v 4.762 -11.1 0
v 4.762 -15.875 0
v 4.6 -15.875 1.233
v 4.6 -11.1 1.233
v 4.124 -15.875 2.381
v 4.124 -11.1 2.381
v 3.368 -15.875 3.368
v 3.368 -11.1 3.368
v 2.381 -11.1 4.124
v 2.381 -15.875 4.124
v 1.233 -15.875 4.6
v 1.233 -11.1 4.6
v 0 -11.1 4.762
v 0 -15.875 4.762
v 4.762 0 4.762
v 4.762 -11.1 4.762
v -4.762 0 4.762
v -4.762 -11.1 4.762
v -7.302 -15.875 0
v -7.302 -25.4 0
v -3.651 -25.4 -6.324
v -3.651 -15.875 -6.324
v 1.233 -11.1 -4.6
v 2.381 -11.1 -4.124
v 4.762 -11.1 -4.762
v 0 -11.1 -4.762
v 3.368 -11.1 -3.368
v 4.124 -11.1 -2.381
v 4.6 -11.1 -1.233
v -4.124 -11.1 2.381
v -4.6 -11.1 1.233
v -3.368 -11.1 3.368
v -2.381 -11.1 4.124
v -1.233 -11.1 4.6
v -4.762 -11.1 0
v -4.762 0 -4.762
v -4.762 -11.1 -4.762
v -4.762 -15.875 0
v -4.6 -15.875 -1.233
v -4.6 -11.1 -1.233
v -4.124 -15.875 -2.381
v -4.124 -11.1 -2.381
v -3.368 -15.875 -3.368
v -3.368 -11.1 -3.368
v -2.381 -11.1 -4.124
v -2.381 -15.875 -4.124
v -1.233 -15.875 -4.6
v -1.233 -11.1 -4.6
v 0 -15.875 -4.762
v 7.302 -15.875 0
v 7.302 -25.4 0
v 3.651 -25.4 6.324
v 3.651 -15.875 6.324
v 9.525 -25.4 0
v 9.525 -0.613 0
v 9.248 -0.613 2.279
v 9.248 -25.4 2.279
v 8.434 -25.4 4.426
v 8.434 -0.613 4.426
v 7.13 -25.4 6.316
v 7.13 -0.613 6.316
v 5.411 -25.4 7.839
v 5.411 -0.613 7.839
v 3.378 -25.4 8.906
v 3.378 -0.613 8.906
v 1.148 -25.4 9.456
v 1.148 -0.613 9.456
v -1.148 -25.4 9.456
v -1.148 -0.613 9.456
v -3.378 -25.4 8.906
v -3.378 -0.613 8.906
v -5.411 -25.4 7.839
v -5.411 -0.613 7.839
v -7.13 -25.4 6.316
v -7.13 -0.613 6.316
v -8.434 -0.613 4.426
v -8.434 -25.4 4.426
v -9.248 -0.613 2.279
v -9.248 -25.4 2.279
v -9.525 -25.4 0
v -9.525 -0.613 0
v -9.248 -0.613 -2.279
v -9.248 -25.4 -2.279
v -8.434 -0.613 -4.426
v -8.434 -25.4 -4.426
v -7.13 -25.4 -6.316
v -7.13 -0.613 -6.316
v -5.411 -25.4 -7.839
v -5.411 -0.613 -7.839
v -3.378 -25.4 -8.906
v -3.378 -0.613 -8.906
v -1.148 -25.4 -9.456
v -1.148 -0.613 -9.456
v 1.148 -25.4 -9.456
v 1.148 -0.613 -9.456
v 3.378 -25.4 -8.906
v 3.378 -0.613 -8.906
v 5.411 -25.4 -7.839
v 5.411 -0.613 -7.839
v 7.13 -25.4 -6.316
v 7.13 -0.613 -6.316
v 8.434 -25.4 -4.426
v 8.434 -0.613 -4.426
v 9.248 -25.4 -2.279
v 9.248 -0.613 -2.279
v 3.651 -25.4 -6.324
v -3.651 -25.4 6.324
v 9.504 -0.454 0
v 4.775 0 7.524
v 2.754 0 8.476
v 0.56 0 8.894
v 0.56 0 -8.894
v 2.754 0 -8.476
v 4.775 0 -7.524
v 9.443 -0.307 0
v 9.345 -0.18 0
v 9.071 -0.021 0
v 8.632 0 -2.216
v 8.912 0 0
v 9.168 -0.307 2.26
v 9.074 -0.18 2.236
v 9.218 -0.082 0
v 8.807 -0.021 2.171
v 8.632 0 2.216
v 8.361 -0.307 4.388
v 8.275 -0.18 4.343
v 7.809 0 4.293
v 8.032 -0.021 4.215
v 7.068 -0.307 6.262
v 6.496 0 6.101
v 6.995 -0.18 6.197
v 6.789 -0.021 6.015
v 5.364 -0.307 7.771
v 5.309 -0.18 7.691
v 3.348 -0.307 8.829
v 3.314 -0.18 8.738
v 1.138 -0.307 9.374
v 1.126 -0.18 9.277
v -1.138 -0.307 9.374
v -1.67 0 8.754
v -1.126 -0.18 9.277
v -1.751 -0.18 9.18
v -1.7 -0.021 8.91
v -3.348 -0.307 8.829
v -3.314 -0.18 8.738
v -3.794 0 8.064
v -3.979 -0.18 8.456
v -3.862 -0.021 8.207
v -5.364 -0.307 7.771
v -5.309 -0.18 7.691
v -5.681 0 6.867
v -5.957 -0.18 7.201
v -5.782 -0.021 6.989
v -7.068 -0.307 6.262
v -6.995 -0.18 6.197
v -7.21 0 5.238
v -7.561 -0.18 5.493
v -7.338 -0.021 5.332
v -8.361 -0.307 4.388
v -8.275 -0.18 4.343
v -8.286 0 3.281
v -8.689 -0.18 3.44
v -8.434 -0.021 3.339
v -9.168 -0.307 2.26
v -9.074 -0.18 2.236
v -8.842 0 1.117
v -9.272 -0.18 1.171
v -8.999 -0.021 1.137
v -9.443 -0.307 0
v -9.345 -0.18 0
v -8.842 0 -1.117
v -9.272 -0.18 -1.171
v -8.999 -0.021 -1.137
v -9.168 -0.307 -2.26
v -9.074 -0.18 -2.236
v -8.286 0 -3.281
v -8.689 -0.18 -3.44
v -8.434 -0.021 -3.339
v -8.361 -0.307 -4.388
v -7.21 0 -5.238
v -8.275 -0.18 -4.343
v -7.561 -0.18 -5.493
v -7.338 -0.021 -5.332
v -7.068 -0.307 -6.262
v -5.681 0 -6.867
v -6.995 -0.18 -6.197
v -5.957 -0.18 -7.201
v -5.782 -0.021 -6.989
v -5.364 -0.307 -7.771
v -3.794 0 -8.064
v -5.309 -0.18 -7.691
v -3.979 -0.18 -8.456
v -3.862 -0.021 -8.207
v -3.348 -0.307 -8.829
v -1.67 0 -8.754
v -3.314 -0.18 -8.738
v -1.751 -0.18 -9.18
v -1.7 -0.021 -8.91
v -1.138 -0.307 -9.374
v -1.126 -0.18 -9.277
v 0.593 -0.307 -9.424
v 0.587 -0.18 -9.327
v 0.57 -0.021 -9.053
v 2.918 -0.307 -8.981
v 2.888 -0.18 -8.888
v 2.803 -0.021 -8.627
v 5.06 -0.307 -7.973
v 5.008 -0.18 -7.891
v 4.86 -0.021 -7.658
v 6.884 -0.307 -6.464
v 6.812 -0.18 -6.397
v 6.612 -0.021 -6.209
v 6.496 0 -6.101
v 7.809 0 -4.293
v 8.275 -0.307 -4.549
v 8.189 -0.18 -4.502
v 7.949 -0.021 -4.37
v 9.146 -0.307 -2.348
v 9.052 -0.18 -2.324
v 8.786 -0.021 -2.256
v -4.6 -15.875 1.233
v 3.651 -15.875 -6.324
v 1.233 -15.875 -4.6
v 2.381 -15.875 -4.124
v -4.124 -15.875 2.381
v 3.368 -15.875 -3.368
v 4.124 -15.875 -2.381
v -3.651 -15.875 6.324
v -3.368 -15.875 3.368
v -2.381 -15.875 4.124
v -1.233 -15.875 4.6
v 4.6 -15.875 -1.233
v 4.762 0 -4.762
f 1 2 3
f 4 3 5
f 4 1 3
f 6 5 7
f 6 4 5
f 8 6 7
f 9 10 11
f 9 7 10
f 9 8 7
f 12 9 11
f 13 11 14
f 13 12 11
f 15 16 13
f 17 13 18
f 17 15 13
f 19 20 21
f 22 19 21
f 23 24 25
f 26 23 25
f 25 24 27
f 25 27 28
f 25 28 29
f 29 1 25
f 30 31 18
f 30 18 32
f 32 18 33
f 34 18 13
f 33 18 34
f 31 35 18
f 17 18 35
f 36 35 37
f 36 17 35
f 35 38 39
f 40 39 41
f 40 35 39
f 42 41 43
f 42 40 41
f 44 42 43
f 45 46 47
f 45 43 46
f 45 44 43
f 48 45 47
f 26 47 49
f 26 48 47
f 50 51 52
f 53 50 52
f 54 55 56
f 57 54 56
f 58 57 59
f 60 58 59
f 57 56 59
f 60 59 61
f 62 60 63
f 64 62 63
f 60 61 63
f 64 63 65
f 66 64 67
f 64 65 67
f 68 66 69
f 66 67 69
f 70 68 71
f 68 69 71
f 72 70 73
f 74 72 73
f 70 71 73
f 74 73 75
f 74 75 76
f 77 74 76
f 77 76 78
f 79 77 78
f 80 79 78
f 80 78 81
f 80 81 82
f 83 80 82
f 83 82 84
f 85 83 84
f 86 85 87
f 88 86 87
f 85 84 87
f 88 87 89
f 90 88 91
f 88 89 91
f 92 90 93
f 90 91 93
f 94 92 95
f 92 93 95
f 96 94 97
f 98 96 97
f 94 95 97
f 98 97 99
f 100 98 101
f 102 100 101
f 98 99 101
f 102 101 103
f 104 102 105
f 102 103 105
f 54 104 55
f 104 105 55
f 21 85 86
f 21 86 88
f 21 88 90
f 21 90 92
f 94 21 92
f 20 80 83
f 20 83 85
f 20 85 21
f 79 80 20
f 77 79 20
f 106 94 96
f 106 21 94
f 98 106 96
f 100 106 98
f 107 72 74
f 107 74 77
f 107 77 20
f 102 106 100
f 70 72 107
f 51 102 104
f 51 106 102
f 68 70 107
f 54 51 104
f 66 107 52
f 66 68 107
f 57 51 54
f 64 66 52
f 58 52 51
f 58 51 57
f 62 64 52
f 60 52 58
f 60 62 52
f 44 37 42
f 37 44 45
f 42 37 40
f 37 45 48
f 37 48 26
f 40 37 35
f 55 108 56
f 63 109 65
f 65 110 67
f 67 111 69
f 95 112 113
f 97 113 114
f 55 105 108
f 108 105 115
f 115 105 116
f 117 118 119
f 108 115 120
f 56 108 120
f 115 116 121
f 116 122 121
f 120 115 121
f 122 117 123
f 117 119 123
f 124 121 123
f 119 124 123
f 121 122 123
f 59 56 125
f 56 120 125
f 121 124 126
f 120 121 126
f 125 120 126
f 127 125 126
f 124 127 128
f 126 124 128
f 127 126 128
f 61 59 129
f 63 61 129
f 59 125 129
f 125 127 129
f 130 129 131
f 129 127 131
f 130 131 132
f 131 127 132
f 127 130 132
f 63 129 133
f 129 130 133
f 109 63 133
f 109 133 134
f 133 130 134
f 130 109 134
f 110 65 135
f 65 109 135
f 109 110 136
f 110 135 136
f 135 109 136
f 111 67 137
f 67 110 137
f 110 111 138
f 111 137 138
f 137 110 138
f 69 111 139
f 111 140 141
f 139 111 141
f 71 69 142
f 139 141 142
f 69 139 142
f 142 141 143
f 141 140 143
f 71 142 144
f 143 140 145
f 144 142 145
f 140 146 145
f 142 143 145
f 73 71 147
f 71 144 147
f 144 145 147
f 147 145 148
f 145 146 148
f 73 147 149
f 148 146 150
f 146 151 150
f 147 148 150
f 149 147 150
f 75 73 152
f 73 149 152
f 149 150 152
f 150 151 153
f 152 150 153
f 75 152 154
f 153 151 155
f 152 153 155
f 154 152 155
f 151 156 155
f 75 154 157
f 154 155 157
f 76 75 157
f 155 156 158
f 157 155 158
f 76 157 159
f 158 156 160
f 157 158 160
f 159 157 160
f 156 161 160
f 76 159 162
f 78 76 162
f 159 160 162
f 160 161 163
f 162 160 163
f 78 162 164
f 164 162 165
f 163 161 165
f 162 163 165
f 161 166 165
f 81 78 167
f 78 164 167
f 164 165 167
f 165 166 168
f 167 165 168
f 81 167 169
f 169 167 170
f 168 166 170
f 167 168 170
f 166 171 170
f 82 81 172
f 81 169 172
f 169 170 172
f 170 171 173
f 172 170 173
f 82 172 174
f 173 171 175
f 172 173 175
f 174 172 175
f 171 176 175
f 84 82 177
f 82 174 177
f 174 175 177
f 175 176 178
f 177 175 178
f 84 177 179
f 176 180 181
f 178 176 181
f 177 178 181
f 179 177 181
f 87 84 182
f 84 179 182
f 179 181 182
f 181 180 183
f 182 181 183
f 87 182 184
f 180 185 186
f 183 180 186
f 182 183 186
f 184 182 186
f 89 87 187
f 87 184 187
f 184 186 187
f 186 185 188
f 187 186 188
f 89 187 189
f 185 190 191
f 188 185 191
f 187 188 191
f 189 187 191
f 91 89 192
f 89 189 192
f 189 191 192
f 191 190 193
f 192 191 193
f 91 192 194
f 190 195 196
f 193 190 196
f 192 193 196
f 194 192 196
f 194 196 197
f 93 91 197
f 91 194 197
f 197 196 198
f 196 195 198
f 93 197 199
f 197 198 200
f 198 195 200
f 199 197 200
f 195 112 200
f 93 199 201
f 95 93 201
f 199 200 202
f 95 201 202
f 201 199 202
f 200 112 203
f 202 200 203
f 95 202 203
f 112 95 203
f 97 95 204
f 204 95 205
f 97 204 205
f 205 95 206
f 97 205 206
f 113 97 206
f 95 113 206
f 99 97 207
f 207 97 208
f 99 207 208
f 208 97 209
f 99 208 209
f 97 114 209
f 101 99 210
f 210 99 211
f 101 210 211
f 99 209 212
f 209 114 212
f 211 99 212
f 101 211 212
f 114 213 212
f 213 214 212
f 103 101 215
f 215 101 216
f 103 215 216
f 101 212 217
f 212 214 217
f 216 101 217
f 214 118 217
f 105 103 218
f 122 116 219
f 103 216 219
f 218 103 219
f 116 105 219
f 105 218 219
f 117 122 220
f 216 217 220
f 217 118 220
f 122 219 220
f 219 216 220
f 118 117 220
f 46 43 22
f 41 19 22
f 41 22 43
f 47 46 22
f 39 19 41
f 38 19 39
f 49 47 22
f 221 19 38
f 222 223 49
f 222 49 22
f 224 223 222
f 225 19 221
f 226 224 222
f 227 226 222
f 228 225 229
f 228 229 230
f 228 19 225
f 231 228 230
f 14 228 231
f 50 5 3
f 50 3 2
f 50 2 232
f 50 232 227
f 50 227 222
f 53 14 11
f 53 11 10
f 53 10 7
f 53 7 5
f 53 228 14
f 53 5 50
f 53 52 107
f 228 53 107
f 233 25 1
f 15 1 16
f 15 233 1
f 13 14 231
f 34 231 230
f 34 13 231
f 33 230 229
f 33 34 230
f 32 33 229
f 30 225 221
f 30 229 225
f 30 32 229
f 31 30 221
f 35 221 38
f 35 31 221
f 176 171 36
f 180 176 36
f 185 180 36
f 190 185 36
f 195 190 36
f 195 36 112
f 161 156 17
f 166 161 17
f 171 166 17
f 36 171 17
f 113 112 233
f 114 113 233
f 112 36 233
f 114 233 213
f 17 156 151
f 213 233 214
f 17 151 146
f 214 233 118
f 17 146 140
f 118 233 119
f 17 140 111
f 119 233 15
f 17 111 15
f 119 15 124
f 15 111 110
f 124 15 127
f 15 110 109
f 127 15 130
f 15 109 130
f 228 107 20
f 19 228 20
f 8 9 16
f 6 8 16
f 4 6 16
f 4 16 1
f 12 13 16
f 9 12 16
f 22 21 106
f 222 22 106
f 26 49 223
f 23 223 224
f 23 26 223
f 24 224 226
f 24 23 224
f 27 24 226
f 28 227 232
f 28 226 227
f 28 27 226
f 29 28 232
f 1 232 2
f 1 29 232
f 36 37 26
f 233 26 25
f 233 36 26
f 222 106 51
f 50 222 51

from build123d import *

# Parameters (mm, degrees)
F0_R     = 9.525
F1_DEPTH = 25.4
F3_DEPTH = 25.401
F4_DEPTH = 11.0998
F6_DEPTH = 9.525
F7_R     = 0.61321


with BuildPart() as f1:
    # F0 (on Front) → F1 (new body)
    with BuildSketch(Plane.XZ):
        Circle(F0_R)
    extrude(amount=F1_DEPTH)

    # F2 (on Front) → F3 (cut, through all)
    with BuildSketch(Plane.XZ):
        with BuildLine():
            ThreePointArc((4.7625, 0), (3.367596, 3.367596), (0, 4.7625))
            ThreePointArc((0, 4.7625), (-3.367596, 3.367596), (-4.7625, 0))
            ThreePointArc((-4.7625, 0), (-3.367596, -3.367596), (0, -4.7625))
            ThreePointArc((0, -4.7625), (3.367596, -3.367596), (4.7625, 0))
        make_face()
    extrude(amount=F3_DEPTH, mode=Mode.SUBTRACT)

    # F2 (on Front) → F4 (cut)
    with BuildSketch(Plane.XZ):
        with BuildLine():
            ThreePointArc((0, -4.7625), (-3.367596, -3.367596), (-4.7625, 0))
            Line((-4.7625, 0), (-4.7625, -4.7625))
            Line((-4.7625, -4.7625), (0, -4.7625))
        make_face()
        with BuildLine():
            ThreePointArc((-4.7625, 0), (-3.367596, 3.367596), (0, 4.7625))
            Line((0, 4.7625), (-4.7625, 4.7625))
            Line((-4.7625, 4.7625), (-4.7625, 0))
        make_face()
        with BuildLine():
            Line((4.7625, 0), (4.7625, 4.7625))
            Line((4.7625, 4.7625), (0, 4.7625))
            ThreePointArc((0, 4.7625), (3.367596, 3.367596), (4.7625, 0))
        make_face()
        with BuildLine():
            Line((4.7625, -4.7625), (4.7625, 0))
            ThreePointArc((4.7625, 0), (3.367596, -3.367596), (0, -4.7625))
            Line((0, -4.7625), (4.7625, -4.7625))
        make_face()
    extrude(amount=F4_DEPTH, mode=Mode.SUBTRACT)

    # F5 (on face) → F6 (cut)
    with BuildSketch(Plane.XZ.offset(25.4)):
        Polygon((3.65125, -6.324151), (7.3025, 0), (3.65125, 6.324151), (-3.65125, 6.324151), (-7.3025, 0), (-3.65125, -6.324151), align=None)
    extrude(amount=-F6_DEPTH, mode=Mode.SUBTRACT)

    # F7
    f7_edges = [f1.edges().sort_by_distance(p)[0] for p in [
        (-9.525, 0, 0),
    ]]
    fillet(f7_edges, radius=F7_R)


solid = f1.part
